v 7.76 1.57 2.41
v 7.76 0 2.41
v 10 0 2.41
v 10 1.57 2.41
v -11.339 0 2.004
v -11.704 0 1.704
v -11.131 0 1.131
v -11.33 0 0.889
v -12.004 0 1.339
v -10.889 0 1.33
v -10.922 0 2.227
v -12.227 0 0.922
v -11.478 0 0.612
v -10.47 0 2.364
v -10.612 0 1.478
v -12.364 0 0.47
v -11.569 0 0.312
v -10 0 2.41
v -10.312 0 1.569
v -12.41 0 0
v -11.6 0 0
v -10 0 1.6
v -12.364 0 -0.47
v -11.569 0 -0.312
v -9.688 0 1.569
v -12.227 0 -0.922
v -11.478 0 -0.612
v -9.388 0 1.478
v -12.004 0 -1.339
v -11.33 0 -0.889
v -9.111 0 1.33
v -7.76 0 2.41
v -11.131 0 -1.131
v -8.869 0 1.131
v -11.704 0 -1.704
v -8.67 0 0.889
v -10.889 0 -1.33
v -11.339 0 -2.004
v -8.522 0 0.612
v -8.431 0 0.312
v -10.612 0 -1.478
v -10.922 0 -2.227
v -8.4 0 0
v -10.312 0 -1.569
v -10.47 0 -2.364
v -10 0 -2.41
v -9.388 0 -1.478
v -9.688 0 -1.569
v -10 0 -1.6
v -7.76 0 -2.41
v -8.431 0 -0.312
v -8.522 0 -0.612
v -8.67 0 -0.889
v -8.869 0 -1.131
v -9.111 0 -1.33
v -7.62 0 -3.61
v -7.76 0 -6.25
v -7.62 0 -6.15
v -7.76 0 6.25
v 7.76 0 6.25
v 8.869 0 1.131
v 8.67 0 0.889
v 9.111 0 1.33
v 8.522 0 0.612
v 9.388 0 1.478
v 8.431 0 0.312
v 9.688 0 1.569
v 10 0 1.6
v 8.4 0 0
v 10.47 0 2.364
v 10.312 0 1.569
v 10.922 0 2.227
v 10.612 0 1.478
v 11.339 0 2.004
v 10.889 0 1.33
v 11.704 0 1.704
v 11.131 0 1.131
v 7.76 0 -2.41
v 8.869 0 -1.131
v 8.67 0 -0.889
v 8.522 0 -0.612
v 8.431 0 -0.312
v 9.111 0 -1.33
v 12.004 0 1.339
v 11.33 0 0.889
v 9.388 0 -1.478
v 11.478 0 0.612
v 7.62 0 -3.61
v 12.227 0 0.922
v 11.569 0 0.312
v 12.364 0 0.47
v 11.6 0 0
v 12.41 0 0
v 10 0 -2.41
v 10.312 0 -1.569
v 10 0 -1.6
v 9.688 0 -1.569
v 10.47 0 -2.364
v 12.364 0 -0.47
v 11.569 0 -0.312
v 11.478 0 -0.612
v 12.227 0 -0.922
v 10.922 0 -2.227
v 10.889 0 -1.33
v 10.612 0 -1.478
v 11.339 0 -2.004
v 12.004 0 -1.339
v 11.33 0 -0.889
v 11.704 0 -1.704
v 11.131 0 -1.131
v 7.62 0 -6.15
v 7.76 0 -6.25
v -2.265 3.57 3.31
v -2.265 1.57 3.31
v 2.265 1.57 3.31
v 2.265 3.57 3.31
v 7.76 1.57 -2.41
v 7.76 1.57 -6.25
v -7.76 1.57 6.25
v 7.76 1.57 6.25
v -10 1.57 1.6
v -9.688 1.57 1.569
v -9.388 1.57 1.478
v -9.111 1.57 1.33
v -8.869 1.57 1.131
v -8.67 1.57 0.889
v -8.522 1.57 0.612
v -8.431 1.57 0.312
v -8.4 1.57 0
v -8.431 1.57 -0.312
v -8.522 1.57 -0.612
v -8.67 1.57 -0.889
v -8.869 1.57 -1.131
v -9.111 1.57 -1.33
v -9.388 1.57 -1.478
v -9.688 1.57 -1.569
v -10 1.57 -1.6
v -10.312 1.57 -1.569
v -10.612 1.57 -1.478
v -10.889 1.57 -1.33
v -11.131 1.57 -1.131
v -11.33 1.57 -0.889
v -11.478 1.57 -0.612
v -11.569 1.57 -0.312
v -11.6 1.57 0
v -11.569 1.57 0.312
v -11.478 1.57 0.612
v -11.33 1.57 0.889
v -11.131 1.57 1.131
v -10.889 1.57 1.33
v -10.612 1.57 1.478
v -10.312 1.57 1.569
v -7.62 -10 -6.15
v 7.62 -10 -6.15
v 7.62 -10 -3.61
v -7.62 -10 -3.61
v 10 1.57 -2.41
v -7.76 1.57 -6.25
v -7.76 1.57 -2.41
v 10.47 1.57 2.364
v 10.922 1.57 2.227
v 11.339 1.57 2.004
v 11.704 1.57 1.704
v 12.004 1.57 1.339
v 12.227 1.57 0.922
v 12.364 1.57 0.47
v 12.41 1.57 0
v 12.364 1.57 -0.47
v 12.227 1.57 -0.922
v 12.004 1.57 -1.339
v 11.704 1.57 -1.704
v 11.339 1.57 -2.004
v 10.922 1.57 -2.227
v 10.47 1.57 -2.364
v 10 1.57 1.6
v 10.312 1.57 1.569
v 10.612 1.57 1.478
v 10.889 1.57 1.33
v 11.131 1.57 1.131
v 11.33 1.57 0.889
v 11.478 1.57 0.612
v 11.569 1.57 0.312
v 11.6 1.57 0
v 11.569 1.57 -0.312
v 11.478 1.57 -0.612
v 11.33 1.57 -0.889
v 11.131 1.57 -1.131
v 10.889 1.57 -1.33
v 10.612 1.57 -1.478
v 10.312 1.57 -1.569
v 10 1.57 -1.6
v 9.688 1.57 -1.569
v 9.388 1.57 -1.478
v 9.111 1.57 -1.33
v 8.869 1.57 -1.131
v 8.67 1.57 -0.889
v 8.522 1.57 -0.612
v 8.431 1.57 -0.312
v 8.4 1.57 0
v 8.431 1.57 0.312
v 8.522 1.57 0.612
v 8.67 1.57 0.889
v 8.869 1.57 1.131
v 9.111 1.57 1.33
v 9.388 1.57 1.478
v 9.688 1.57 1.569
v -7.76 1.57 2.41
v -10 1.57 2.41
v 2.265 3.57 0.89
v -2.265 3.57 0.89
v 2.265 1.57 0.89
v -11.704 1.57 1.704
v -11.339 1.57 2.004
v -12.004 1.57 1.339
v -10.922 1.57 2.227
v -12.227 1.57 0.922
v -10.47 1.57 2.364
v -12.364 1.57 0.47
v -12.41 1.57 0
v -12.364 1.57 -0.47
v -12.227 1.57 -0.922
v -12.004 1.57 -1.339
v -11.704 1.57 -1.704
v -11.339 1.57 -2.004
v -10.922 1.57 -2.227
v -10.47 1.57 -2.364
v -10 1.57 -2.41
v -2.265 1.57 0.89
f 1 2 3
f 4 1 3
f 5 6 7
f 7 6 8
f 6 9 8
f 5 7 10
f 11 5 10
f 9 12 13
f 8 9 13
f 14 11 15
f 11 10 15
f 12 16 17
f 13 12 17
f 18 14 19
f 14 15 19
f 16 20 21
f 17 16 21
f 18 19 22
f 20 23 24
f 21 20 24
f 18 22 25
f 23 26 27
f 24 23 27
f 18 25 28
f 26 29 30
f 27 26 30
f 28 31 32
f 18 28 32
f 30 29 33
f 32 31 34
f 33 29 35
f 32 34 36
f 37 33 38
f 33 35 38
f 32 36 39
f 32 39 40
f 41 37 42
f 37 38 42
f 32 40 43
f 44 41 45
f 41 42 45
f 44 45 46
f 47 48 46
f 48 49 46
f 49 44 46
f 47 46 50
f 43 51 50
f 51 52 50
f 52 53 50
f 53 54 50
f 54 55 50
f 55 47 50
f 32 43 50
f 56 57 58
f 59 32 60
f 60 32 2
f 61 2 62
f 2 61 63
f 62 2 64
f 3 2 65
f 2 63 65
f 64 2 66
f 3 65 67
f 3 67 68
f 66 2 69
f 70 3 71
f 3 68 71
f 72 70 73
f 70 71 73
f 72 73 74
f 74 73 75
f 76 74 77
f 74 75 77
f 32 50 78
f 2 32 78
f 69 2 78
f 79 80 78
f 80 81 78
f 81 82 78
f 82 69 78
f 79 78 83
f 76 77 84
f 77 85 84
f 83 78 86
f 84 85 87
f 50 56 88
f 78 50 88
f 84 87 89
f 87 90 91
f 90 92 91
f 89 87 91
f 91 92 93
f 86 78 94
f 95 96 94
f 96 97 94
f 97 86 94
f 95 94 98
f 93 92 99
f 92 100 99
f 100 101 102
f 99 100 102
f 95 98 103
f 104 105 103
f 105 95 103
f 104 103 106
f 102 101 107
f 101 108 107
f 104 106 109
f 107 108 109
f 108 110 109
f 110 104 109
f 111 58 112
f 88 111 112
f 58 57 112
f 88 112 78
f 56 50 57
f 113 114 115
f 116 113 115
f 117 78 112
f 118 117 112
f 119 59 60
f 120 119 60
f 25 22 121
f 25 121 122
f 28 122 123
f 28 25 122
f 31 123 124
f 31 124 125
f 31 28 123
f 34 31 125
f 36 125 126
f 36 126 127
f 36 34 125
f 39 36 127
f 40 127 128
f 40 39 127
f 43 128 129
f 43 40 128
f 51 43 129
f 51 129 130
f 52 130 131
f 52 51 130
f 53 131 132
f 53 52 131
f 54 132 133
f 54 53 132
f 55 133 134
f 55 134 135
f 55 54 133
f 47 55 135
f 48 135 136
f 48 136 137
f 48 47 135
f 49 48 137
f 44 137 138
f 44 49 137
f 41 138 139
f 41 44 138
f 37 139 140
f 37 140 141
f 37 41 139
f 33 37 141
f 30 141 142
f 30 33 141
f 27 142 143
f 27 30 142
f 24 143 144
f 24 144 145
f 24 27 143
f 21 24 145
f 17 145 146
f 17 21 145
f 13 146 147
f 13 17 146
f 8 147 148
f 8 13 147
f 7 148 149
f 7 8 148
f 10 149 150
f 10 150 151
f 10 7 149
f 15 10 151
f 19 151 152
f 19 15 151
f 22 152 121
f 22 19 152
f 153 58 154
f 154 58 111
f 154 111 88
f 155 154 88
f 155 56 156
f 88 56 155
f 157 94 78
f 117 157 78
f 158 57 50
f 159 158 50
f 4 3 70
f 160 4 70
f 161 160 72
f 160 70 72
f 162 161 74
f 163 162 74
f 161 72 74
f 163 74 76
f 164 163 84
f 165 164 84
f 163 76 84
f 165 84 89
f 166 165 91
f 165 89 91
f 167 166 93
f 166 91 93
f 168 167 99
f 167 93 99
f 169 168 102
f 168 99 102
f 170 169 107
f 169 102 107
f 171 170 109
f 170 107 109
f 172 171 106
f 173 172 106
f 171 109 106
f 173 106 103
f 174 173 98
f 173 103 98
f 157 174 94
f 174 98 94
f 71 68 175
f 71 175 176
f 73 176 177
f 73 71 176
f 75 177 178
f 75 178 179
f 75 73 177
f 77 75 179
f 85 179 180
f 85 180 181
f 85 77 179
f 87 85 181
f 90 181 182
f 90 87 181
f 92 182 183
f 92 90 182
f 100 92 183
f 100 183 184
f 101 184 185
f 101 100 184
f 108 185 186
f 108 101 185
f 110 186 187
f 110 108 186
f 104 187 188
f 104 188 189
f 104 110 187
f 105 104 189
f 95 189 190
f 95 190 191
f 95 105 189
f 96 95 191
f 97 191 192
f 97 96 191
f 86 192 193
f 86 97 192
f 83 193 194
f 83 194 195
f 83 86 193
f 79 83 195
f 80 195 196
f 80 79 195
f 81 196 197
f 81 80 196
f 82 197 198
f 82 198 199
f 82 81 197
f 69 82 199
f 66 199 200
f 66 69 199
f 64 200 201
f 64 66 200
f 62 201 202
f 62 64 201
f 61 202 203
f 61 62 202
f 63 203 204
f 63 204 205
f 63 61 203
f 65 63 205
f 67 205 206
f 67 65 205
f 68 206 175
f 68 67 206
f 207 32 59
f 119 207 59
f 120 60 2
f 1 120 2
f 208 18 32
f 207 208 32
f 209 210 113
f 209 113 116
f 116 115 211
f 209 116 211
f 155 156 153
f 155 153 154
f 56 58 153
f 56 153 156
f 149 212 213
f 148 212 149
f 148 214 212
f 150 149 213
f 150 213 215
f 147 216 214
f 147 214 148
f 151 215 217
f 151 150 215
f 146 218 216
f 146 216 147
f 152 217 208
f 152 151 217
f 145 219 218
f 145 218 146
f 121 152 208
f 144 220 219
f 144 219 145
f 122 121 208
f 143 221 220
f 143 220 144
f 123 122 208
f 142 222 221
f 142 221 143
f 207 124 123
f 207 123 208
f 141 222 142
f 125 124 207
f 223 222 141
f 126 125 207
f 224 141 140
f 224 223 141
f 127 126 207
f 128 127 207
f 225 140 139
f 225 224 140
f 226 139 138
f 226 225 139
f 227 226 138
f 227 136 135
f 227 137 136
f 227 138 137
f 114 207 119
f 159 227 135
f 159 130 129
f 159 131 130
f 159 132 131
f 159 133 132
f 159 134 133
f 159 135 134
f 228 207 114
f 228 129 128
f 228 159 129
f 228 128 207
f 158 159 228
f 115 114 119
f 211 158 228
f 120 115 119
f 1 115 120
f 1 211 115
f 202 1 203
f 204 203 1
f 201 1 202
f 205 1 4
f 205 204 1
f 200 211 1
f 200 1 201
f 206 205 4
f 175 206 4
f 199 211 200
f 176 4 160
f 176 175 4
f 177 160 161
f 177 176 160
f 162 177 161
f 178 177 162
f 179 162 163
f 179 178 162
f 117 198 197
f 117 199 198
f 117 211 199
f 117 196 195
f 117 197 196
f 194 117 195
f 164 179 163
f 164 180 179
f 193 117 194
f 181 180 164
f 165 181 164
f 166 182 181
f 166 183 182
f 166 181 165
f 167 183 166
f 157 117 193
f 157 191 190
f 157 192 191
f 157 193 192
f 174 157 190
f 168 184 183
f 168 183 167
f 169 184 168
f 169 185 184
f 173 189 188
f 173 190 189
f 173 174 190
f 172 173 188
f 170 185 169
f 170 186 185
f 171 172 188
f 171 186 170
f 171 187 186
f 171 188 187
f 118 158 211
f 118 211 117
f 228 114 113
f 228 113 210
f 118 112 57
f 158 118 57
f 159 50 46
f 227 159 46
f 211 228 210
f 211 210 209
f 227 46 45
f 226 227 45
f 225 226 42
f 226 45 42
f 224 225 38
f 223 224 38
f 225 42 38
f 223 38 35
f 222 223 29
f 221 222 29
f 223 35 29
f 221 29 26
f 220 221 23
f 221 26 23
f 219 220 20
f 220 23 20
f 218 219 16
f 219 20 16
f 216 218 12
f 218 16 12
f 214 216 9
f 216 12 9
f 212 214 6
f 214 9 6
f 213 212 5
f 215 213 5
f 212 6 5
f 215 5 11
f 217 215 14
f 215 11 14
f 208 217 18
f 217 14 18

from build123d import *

# Parameters (mm, degrees)
SKETCH1_R           = 1.6
BOSS_EXTRUDE1_DEPTH = 1.57
SKETCH2_W           = 4.53
SKETCH2_H           = 2.42
BOSS_EXTRUDE2_DEPTH = 2
SKETCH3_W           = 15.24
SKETCH3_H           = 2.54
BOSS_EXTRUDE3_DEPTH = 10


with BuildPart() as part:
    # Sketch1 → Boss-Extrude1 (new body)
    with BuildSketch(Plane(origin=(0, 0, 0), x_dir=(1, 0, 0), z_dir=(0, 1, 0))):
        with BuildLine():
            Line((-7.76, -6.25), (7.76, -6.25))
            Line((7.76, -6.25), (7.76, -2.41))
            Line((7.76, -2.41), (10, -2.41))
            ThreePointArc((10, -2.41), (12.41, 0), (10, 2.41))
            Line((10, 2.41), (7.76, 2.41))
            Line((7.76, 2.41), (7.76, 6.25))
            Line((7.76, 6.25), (-7.76, 6.25))
            Line((-7.76, 6.25), (-7.76, 2.41))
            Line((-7.76, 2.41), (-10, 2.41))
            ThreePointArc((-10, 2.41), (-12.41, 0), (-10, -2.41))
            Line((-10, -2.41), (-7.76, -2.41))
            Line((-7.76, -2.41), (-7.76, -6.25))
        make_face()
        with Locations(Location((-10, 0, 0), (0, 0, 270))):
            Circle(SKETCH1_R, mode=Mode.SUBTRACT)
        with Locations(Location((10, 0, 0), (0, 0, 270))):
            Circle(SKETCH1_R, mode=Mode.SUBTRACT)
    extrude(amount=BOSS_EXTRUDE1_DEPTH)

    # Sketch2 → Boss-Extrude2 (add)
    with BuildSketch(Plane(origin=(0, 1.57, 0), x_dir=(1, 0, 0), z_dir=(0, 1, 0))):
        with Locations((0, -2.1)):
            Rectangle(SKETCH2_W, SKETCH2_H)
    extrude(amount=BOSS_EXTRUDE2_DEPTH)

    # Sketch3 → Boss-Extrude3 (add)
    with BuildSketch(Plane.XZ):
        with Locations((0, -4.88)):
            Rectangle(SKETCH3_W, SKETCH3_H)
    extrude(amount=BOSS_EXTRUDE3_DEPTH)


solid = part.part
